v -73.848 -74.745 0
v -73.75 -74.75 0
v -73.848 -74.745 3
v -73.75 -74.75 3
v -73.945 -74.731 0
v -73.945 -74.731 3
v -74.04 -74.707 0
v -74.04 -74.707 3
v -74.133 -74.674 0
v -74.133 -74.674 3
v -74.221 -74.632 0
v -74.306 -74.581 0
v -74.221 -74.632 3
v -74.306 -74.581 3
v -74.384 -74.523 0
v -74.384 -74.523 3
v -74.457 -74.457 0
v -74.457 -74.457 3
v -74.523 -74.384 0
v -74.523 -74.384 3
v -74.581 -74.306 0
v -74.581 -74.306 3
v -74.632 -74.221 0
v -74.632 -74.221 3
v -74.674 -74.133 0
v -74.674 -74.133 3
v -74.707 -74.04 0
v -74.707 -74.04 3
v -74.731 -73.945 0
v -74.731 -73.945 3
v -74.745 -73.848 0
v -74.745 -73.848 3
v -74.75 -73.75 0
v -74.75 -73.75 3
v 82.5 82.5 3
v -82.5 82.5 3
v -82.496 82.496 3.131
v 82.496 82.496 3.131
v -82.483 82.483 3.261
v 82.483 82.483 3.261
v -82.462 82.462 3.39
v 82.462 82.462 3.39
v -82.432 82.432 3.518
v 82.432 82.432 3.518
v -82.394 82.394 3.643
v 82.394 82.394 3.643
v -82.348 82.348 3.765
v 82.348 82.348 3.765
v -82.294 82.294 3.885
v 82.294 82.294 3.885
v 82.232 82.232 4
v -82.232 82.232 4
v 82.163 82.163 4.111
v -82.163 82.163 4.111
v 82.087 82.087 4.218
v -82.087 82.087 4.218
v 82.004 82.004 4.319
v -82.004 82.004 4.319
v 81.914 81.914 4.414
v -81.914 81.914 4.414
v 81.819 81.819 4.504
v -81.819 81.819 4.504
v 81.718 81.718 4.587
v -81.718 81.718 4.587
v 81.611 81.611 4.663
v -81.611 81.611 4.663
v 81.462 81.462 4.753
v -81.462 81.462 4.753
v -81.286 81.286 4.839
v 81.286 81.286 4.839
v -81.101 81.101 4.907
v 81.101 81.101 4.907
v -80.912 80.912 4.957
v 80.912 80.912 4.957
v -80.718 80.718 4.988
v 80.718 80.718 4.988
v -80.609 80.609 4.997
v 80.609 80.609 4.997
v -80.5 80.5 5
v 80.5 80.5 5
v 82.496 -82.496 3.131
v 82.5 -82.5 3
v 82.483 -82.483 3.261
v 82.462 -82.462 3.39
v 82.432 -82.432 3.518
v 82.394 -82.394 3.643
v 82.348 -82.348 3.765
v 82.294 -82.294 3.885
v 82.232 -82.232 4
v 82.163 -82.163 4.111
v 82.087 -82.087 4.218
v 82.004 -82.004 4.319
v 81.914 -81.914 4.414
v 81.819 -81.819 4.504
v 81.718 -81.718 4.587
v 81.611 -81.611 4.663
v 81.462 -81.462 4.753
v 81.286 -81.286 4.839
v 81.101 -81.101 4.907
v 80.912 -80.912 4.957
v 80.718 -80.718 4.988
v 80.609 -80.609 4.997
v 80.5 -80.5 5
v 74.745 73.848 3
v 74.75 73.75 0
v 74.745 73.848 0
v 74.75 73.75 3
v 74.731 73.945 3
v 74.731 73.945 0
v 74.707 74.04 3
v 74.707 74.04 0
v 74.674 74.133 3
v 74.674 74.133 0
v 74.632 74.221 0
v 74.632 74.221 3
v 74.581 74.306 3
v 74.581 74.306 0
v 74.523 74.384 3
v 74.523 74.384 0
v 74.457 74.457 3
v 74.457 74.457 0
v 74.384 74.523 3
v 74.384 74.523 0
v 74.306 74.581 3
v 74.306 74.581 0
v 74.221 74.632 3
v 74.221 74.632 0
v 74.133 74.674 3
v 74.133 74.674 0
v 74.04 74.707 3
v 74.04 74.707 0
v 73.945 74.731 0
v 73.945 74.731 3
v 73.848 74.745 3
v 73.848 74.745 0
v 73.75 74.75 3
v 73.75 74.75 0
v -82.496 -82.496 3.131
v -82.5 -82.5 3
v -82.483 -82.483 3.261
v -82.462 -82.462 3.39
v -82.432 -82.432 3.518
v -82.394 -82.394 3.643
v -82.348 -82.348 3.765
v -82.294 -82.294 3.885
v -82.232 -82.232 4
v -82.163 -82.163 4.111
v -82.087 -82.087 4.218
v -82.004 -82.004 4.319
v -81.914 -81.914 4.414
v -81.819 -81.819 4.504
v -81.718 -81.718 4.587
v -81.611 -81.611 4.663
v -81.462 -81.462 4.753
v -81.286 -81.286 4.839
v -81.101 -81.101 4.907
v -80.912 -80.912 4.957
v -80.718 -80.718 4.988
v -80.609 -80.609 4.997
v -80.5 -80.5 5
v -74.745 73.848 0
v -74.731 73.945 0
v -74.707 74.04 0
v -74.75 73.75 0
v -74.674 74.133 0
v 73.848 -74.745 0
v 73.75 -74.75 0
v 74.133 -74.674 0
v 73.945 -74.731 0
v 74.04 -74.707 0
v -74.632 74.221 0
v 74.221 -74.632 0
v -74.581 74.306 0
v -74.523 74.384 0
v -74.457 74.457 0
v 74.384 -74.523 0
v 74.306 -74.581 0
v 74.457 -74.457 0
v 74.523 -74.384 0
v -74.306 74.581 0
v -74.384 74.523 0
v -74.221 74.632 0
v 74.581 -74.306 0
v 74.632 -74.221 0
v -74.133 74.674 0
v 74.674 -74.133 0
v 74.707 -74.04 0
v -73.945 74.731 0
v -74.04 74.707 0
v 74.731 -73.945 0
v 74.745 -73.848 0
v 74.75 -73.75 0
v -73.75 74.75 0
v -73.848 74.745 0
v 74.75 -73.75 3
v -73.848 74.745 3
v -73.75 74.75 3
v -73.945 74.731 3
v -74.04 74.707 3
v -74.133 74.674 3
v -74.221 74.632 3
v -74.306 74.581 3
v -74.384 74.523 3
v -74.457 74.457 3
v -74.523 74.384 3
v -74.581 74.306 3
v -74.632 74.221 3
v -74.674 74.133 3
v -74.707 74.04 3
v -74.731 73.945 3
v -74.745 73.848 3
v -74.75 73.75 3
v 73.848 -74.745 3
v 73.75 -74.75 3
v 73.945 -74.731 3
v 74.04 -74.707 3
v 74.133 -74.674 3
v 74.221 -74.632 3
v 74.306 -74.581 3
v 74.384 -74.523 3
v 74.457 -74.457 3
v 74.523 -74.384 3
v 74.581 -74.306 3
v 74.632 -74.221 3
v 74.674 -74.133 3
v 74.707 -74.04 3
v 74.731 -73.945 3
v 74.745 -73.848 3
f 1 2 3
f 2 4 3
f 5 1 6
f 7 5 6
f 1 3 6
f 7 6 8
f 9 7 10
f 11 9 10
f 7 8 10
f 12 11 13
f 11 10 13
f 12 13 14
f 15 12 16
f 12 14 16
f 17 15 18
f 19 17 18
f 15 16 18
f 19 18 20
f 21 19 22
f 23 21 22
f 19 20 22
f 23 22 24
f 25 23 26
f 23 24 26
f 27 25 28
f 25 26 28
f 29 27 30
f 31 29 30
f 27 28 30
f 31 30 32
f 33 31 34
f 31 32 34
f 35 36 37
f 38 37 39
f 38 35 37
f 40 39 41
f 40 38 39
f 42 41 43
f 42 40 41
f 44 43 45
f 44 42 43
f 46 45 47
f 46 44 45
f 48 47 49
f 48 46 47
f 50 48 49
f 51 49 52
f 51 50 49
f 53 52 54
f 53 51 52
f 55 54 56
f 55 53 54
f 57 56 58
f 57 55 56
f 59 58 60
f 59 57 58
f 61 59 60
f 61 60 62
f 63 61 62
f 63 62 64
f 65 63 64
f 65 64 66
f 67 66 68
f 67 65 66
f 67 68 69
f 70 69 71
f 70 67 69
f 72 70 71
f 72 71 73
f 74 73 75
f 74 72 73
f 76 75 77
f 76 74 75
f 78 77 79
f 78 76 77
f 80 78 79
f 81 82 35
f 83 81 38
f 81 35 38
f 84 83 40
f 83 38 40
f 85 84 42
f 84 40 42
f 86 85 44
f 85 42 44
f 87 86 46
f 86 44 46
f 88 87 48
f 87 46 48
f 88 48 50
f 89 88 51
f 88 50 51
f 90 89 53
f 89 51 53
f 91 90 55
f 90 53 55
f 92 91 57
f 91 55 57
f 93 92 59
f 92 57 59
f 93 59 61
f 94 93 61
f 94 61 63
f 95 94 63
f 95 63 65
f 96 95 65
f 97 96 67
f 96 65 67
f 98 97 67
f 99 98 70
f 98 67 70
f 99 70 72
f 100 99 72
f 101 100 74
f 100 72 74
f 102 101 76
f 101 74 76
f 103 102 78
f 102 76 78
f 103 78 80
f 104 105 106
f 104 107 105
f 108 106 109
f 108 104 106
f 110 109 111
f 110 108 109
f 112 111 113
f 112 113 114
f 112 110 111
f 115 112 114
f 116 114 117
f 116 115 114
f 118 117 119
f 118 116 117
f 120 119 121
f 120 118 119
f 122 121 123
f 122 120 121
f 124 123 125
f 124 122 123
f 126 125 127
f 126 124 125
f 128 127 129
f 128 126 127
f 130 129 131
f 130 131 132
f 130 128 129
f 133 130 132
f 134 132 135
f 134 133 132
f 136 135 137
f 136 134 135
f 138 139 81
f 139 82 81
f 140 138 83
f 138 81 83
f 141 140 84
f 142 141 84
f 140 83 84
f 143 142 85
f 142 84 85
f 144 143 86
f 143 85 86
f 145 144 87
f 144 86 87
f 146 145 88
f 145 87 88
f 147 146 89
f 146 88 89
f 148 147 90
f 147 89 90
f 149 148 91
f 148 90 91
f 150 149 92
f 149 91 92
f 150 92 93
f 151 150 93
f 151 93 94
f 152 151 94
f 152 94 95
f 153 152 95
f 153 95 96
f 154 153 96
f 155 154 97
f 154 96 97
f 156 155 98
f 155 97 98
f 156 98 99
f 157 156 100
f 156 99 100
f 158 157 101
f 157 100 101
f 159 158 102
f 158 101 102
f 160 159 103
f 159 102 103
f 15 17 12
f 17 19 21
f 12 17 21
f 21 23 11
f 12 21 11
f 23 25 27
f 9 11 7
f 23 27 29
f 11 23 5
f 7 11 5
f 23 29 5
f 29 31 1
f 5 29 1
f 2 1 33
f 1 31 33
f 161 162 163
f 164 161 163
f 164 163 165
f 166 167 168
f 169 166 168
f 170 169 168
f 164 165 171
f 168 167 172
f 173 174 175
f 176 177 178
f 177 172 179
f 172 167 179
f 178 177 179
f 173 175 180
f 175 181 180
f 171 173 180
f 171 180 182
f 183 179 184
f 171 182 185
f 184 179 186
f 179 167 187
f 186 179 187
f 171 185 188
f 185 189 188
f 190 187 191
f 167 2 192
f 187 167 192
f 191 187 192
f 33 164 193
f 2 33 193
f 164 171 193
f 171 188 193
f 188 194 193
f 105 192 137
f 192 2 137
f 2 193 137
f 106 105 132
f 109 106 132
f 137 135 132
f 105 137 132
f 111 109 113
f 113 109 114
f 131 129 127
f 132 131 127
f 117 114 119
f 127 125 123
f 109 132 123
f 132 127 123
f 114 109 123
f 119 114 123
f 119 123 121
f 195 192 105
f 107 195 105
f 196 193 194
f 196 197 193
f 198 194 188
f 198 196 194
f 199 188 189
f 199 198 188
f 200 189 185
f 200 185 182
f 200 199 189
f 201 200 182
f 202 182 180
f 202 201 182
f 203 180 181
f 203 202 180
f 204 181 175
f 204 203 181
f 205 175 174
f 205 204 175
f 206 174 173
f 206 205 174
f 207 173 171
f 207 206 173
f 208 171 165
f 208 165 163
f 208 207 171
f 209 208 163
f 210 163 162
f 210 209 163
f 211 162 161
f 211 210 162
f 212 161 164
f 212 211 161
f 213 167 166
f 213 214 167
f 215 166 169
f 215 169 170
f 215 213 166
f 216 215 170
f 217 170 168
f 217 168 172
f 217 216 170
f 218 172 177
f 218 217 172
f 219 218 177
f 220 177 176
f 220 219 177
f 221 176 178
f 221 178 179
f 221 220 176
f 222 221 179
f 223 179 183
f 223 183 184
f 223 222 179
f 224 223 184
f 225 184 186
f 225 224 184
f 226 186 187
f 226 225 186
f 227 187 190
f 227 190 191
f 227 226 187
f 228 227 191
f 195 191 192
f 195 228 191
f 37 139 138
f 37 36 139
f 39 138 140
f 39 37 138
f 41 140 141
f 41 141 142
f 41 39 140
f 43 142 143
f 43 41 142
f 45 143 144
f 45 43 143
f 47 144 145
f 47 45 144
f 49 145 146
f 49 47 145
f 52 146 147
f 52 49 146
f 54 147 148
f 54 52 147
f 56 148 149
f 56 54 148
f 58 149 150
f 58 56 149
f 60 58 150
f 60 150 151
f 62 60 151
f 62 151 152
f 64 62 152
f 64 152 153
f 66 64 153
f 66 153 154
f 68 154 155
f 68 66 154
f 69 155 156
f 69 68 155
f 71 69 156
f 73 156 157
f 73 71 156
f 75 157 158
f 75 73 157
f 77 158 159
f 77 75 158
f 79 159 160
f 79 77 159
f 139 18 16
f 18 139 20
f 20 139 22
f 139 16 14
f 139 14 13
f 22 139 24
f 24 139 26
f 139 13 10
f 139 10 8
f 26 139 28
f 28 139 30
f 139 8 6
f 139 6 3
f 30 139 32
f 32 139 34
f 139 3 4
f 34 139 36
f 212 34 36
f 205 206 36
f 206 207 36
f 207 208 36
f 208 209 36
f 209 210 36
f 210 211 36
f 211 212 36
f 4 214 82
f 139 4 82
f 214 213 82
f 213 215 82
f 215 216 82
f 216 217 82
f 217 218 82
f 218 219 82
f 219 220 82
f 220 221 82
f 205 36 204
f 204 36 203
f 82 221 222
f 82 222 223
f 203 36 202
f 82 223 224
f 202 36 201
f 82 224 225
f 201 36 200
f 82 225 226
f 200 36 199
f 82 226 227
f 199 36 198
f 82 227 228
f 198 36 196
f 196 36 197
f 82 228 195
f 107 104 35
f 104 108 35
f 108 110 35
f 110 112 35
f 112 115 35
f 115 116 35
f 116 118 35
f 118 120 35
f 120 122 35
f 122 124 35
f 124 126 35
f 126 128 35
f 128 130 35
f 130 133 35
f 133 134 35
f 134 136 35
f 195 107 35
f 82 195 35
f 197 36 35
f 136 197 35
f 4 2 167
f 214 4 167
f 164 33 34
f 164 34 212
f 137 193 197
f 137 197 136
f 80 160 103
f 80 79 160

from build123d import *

# Parameters (mm, degrees)
SKETCH_1_W      = 149.5
SKETCH_1_H      = 149.5
EXTRUDE_1_DEPTH = 3
SKETCH_2_W      = 165
SKETCH_2_H      = 165
EXTRUDE_2_DEPTH = 2
FILLET_1_R      = 1
FILLET_2_R      = 2


with BuildPart() as part:
    # 草图1 → 凸台-拉伸1 (new body)
    with BuildSketch(Plane.XY):
        Rectangle(SKETCH_1_W, SKETCH_1_H)
    extrude(amount=EXTRUDE_1_DEPTH)

    # 草图2 → 凸台-拉伸2 (add)
    with BuildSketch(Plane.XY.offset(3)):
        Rectangle(SKETCH_2_W, SKETCH_2_H)
    extrude(amount=EXTRUDE_2_DEPTH)

    # 圆角1
    fillet_1_edges = [part.edges().sort_by_distance(p)[0] for p in [
        (74.75, -74.75, 1.5),
        (-74.75, -74.75, 1.5),
        (-74.75, 74.75, 1.5),
        (74.75, 74.75, 1.5),
    ]]
    fillet(fillet_1_edges, radius=FILLET_1_R)

    # 圆角2
    fillet_2_edges = [part.edges().sort_by_distance(p)[0] for p in [
        (0, -82.5, 5),
        (-82.5, 0, 5),
        (0, 82.5, 5),
        (82.5, 0, 5),
    ]]
    fillet(fillet_2_edges, radius=FILLET_2_R - 0.0001)  # a hair under: the kernel refuses the full size


solid = part.part
